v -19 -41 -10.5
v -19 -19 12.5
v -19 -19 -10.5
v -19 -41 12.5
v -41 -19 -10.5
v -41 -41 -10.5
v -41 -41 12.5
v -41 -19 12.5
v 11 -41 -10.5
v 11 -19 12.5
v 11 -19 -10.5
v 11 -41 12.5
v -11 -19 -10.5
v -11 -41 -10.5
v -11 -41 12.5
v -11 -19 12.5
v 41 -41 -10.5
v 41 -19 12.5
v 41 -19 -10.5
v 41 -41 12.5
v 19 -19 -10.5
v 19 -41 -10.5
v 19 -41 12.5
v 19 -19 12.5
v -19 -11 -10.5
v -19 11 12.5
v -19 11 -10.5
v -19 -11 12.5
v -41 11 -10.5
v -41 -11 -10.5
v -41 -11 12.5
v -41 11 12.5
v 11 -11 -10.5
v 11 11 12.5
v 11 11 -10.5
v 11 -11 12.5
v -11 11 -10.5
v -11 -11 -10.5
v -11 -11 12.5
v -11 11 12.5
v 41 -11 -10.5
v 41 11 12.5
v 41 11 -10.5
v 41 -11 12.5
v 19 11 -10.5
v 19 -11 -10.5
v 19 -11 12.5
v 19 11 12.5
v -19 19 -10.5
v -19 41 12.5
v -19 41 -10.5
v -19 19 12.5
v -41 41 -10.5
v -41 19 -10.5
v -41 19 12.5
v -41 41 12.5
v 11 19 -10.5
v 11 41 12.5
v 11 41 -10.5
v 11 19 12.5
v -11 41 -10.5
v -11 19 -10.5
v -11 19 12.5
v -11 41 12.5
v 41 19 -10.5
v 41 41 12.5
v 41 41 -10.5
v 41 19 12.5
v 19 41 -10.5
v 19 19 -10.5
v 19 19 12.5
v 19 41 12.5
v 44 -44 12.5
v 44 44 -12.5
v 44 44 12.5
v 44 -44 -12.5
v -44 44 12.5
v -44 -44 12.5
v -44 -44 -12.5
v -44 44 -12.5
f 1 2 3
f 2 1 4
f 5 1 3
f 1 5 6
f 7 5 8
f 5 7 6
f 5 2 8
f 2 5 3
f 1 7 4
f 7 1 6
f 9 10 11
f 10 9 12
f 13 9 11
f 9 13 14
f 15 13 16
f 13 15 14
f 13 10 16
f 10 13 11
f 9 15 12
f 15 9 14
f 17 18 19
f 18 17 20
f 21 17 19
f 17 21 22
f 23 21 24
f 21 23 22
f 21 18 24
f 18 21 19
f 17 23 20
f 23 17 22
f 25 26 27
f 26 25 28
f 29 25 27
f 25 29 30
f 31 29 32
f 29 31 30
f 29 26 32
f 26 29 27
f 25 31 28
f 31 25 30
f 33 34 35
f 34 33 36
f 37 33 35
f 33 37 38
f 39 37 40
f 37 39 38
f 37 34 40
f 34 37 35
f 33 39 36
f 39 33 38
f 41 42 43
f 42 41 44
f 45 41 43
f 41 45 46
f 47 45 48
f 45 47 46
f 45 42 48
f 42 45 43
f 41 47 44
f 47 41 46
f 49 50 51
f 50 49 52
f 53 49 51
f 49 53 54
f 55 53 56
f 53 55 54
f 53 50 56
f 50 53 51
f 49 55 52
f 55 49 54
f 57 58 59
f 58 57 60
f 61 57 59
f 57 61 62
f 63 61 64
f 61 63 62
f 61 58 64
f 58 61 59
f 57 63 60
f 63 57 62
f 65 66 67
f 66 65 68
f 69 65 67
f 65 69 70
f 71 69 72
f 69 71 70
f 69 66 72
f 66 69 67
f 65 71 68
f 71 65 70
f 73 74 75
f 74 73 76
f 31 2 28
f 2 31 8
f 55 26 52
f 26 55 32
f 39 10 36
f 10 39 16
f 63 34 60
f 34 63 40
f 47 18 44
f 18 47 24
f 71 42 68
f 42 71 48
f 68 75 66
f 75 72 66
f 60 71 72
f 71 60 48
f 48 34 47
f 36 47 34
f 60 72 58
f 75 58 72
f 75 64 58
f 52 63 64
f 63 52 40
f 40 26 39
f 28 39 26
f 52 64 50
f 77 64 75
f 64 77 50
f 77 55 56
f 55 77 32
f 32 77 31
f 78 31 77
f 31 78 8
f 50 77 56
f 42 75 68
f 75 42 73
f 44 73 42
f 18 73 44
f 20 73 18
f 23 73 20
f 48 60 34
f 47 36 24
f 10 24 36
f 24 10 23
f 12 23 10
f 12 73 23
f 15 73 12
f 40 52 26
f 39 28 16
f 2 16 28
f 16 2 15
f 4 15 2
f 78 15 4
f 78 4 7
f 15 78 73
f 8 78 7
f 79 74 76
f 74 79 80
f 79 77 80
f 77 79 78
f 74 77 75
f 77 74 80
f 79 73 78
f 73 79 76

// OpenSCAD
$fn = 32;

// ----------------------------------------------------------------------
// Pocket plate 88 x 88 x 25
// 3 x 3 pockets 22 mm square, 23 mm deep
// ----------------------------------------------------------------------

// --- parameters (mm) ---
thickness = 25;  // plate thickness
floor_t = 2;     // material left under each pocket
pocket = 22;     // pocket side length
pitch_x = 30;    // pocket pitch along X
pitch_y = 30;    // pocket pitch along Y
cols = 3;        // pockets per row
rows = 3;        // rows of pockets

// --- derived feature positions (mm) ---
depth = thickness - floor_t;        // = 23   pocket depth, down to the floor
span_x = (cols - 1) * pitch_x;      // = 60   distance between outer pockets
span_y = (rows - 1) * pitch_y;      // = 60   distance between outer pocket rows
origin_x = -span_x / 2;             // = -30   X of the first pocket
origin_y = -span_y / 2;             // = -30   Y of the first pocket
plate = [span_x + pocket + 6, span_y + pocket + 6, thickness];  // = [88, 88, 25]   overall size: pockets plus 3 mm of wall on each side
feature_centers = [
  [origin_x + 0 * pitch_x, origin_y + 0 * pitch_y],
  [origin_x + 1 * pitch_x, origin_y + 0 * pitch_y],
  [origin_x + 2 * pitch_x, origin_y + 0 * pitch_y],
  [origin_x + 0 * pitch_x, origin_y + 1 * pitch_y],
  [origin_x + 1 * pitch_x, origin_y + 1 * pitch_y],
  [origin_x + 2 * pitch_x, origin_y + 1 * pitch_y],
  [origin_x + 0 * pitch_x, origin_y + 2 * pitch_y],
  [origin_x + 1 * pitch_x, origin_y + 2 * pitch_y],
  [origin_x + 2 * pitch_x, origin_y + 2 * pitch_y]
];   // pocket centres, used verbatim by the cutter loop

// plate outline, then one pocket per centre in feature_centers
difference() {
  cube(plate, center = true);
  for (centre = feature_centers)
    translate([centre[0] - pocket / 2, centre[1] - pocket / 2, plate[2] / 2 - depth])
      cube([pocket, pocket, depth + 1]);  // centred on the declared pocket centre
}
